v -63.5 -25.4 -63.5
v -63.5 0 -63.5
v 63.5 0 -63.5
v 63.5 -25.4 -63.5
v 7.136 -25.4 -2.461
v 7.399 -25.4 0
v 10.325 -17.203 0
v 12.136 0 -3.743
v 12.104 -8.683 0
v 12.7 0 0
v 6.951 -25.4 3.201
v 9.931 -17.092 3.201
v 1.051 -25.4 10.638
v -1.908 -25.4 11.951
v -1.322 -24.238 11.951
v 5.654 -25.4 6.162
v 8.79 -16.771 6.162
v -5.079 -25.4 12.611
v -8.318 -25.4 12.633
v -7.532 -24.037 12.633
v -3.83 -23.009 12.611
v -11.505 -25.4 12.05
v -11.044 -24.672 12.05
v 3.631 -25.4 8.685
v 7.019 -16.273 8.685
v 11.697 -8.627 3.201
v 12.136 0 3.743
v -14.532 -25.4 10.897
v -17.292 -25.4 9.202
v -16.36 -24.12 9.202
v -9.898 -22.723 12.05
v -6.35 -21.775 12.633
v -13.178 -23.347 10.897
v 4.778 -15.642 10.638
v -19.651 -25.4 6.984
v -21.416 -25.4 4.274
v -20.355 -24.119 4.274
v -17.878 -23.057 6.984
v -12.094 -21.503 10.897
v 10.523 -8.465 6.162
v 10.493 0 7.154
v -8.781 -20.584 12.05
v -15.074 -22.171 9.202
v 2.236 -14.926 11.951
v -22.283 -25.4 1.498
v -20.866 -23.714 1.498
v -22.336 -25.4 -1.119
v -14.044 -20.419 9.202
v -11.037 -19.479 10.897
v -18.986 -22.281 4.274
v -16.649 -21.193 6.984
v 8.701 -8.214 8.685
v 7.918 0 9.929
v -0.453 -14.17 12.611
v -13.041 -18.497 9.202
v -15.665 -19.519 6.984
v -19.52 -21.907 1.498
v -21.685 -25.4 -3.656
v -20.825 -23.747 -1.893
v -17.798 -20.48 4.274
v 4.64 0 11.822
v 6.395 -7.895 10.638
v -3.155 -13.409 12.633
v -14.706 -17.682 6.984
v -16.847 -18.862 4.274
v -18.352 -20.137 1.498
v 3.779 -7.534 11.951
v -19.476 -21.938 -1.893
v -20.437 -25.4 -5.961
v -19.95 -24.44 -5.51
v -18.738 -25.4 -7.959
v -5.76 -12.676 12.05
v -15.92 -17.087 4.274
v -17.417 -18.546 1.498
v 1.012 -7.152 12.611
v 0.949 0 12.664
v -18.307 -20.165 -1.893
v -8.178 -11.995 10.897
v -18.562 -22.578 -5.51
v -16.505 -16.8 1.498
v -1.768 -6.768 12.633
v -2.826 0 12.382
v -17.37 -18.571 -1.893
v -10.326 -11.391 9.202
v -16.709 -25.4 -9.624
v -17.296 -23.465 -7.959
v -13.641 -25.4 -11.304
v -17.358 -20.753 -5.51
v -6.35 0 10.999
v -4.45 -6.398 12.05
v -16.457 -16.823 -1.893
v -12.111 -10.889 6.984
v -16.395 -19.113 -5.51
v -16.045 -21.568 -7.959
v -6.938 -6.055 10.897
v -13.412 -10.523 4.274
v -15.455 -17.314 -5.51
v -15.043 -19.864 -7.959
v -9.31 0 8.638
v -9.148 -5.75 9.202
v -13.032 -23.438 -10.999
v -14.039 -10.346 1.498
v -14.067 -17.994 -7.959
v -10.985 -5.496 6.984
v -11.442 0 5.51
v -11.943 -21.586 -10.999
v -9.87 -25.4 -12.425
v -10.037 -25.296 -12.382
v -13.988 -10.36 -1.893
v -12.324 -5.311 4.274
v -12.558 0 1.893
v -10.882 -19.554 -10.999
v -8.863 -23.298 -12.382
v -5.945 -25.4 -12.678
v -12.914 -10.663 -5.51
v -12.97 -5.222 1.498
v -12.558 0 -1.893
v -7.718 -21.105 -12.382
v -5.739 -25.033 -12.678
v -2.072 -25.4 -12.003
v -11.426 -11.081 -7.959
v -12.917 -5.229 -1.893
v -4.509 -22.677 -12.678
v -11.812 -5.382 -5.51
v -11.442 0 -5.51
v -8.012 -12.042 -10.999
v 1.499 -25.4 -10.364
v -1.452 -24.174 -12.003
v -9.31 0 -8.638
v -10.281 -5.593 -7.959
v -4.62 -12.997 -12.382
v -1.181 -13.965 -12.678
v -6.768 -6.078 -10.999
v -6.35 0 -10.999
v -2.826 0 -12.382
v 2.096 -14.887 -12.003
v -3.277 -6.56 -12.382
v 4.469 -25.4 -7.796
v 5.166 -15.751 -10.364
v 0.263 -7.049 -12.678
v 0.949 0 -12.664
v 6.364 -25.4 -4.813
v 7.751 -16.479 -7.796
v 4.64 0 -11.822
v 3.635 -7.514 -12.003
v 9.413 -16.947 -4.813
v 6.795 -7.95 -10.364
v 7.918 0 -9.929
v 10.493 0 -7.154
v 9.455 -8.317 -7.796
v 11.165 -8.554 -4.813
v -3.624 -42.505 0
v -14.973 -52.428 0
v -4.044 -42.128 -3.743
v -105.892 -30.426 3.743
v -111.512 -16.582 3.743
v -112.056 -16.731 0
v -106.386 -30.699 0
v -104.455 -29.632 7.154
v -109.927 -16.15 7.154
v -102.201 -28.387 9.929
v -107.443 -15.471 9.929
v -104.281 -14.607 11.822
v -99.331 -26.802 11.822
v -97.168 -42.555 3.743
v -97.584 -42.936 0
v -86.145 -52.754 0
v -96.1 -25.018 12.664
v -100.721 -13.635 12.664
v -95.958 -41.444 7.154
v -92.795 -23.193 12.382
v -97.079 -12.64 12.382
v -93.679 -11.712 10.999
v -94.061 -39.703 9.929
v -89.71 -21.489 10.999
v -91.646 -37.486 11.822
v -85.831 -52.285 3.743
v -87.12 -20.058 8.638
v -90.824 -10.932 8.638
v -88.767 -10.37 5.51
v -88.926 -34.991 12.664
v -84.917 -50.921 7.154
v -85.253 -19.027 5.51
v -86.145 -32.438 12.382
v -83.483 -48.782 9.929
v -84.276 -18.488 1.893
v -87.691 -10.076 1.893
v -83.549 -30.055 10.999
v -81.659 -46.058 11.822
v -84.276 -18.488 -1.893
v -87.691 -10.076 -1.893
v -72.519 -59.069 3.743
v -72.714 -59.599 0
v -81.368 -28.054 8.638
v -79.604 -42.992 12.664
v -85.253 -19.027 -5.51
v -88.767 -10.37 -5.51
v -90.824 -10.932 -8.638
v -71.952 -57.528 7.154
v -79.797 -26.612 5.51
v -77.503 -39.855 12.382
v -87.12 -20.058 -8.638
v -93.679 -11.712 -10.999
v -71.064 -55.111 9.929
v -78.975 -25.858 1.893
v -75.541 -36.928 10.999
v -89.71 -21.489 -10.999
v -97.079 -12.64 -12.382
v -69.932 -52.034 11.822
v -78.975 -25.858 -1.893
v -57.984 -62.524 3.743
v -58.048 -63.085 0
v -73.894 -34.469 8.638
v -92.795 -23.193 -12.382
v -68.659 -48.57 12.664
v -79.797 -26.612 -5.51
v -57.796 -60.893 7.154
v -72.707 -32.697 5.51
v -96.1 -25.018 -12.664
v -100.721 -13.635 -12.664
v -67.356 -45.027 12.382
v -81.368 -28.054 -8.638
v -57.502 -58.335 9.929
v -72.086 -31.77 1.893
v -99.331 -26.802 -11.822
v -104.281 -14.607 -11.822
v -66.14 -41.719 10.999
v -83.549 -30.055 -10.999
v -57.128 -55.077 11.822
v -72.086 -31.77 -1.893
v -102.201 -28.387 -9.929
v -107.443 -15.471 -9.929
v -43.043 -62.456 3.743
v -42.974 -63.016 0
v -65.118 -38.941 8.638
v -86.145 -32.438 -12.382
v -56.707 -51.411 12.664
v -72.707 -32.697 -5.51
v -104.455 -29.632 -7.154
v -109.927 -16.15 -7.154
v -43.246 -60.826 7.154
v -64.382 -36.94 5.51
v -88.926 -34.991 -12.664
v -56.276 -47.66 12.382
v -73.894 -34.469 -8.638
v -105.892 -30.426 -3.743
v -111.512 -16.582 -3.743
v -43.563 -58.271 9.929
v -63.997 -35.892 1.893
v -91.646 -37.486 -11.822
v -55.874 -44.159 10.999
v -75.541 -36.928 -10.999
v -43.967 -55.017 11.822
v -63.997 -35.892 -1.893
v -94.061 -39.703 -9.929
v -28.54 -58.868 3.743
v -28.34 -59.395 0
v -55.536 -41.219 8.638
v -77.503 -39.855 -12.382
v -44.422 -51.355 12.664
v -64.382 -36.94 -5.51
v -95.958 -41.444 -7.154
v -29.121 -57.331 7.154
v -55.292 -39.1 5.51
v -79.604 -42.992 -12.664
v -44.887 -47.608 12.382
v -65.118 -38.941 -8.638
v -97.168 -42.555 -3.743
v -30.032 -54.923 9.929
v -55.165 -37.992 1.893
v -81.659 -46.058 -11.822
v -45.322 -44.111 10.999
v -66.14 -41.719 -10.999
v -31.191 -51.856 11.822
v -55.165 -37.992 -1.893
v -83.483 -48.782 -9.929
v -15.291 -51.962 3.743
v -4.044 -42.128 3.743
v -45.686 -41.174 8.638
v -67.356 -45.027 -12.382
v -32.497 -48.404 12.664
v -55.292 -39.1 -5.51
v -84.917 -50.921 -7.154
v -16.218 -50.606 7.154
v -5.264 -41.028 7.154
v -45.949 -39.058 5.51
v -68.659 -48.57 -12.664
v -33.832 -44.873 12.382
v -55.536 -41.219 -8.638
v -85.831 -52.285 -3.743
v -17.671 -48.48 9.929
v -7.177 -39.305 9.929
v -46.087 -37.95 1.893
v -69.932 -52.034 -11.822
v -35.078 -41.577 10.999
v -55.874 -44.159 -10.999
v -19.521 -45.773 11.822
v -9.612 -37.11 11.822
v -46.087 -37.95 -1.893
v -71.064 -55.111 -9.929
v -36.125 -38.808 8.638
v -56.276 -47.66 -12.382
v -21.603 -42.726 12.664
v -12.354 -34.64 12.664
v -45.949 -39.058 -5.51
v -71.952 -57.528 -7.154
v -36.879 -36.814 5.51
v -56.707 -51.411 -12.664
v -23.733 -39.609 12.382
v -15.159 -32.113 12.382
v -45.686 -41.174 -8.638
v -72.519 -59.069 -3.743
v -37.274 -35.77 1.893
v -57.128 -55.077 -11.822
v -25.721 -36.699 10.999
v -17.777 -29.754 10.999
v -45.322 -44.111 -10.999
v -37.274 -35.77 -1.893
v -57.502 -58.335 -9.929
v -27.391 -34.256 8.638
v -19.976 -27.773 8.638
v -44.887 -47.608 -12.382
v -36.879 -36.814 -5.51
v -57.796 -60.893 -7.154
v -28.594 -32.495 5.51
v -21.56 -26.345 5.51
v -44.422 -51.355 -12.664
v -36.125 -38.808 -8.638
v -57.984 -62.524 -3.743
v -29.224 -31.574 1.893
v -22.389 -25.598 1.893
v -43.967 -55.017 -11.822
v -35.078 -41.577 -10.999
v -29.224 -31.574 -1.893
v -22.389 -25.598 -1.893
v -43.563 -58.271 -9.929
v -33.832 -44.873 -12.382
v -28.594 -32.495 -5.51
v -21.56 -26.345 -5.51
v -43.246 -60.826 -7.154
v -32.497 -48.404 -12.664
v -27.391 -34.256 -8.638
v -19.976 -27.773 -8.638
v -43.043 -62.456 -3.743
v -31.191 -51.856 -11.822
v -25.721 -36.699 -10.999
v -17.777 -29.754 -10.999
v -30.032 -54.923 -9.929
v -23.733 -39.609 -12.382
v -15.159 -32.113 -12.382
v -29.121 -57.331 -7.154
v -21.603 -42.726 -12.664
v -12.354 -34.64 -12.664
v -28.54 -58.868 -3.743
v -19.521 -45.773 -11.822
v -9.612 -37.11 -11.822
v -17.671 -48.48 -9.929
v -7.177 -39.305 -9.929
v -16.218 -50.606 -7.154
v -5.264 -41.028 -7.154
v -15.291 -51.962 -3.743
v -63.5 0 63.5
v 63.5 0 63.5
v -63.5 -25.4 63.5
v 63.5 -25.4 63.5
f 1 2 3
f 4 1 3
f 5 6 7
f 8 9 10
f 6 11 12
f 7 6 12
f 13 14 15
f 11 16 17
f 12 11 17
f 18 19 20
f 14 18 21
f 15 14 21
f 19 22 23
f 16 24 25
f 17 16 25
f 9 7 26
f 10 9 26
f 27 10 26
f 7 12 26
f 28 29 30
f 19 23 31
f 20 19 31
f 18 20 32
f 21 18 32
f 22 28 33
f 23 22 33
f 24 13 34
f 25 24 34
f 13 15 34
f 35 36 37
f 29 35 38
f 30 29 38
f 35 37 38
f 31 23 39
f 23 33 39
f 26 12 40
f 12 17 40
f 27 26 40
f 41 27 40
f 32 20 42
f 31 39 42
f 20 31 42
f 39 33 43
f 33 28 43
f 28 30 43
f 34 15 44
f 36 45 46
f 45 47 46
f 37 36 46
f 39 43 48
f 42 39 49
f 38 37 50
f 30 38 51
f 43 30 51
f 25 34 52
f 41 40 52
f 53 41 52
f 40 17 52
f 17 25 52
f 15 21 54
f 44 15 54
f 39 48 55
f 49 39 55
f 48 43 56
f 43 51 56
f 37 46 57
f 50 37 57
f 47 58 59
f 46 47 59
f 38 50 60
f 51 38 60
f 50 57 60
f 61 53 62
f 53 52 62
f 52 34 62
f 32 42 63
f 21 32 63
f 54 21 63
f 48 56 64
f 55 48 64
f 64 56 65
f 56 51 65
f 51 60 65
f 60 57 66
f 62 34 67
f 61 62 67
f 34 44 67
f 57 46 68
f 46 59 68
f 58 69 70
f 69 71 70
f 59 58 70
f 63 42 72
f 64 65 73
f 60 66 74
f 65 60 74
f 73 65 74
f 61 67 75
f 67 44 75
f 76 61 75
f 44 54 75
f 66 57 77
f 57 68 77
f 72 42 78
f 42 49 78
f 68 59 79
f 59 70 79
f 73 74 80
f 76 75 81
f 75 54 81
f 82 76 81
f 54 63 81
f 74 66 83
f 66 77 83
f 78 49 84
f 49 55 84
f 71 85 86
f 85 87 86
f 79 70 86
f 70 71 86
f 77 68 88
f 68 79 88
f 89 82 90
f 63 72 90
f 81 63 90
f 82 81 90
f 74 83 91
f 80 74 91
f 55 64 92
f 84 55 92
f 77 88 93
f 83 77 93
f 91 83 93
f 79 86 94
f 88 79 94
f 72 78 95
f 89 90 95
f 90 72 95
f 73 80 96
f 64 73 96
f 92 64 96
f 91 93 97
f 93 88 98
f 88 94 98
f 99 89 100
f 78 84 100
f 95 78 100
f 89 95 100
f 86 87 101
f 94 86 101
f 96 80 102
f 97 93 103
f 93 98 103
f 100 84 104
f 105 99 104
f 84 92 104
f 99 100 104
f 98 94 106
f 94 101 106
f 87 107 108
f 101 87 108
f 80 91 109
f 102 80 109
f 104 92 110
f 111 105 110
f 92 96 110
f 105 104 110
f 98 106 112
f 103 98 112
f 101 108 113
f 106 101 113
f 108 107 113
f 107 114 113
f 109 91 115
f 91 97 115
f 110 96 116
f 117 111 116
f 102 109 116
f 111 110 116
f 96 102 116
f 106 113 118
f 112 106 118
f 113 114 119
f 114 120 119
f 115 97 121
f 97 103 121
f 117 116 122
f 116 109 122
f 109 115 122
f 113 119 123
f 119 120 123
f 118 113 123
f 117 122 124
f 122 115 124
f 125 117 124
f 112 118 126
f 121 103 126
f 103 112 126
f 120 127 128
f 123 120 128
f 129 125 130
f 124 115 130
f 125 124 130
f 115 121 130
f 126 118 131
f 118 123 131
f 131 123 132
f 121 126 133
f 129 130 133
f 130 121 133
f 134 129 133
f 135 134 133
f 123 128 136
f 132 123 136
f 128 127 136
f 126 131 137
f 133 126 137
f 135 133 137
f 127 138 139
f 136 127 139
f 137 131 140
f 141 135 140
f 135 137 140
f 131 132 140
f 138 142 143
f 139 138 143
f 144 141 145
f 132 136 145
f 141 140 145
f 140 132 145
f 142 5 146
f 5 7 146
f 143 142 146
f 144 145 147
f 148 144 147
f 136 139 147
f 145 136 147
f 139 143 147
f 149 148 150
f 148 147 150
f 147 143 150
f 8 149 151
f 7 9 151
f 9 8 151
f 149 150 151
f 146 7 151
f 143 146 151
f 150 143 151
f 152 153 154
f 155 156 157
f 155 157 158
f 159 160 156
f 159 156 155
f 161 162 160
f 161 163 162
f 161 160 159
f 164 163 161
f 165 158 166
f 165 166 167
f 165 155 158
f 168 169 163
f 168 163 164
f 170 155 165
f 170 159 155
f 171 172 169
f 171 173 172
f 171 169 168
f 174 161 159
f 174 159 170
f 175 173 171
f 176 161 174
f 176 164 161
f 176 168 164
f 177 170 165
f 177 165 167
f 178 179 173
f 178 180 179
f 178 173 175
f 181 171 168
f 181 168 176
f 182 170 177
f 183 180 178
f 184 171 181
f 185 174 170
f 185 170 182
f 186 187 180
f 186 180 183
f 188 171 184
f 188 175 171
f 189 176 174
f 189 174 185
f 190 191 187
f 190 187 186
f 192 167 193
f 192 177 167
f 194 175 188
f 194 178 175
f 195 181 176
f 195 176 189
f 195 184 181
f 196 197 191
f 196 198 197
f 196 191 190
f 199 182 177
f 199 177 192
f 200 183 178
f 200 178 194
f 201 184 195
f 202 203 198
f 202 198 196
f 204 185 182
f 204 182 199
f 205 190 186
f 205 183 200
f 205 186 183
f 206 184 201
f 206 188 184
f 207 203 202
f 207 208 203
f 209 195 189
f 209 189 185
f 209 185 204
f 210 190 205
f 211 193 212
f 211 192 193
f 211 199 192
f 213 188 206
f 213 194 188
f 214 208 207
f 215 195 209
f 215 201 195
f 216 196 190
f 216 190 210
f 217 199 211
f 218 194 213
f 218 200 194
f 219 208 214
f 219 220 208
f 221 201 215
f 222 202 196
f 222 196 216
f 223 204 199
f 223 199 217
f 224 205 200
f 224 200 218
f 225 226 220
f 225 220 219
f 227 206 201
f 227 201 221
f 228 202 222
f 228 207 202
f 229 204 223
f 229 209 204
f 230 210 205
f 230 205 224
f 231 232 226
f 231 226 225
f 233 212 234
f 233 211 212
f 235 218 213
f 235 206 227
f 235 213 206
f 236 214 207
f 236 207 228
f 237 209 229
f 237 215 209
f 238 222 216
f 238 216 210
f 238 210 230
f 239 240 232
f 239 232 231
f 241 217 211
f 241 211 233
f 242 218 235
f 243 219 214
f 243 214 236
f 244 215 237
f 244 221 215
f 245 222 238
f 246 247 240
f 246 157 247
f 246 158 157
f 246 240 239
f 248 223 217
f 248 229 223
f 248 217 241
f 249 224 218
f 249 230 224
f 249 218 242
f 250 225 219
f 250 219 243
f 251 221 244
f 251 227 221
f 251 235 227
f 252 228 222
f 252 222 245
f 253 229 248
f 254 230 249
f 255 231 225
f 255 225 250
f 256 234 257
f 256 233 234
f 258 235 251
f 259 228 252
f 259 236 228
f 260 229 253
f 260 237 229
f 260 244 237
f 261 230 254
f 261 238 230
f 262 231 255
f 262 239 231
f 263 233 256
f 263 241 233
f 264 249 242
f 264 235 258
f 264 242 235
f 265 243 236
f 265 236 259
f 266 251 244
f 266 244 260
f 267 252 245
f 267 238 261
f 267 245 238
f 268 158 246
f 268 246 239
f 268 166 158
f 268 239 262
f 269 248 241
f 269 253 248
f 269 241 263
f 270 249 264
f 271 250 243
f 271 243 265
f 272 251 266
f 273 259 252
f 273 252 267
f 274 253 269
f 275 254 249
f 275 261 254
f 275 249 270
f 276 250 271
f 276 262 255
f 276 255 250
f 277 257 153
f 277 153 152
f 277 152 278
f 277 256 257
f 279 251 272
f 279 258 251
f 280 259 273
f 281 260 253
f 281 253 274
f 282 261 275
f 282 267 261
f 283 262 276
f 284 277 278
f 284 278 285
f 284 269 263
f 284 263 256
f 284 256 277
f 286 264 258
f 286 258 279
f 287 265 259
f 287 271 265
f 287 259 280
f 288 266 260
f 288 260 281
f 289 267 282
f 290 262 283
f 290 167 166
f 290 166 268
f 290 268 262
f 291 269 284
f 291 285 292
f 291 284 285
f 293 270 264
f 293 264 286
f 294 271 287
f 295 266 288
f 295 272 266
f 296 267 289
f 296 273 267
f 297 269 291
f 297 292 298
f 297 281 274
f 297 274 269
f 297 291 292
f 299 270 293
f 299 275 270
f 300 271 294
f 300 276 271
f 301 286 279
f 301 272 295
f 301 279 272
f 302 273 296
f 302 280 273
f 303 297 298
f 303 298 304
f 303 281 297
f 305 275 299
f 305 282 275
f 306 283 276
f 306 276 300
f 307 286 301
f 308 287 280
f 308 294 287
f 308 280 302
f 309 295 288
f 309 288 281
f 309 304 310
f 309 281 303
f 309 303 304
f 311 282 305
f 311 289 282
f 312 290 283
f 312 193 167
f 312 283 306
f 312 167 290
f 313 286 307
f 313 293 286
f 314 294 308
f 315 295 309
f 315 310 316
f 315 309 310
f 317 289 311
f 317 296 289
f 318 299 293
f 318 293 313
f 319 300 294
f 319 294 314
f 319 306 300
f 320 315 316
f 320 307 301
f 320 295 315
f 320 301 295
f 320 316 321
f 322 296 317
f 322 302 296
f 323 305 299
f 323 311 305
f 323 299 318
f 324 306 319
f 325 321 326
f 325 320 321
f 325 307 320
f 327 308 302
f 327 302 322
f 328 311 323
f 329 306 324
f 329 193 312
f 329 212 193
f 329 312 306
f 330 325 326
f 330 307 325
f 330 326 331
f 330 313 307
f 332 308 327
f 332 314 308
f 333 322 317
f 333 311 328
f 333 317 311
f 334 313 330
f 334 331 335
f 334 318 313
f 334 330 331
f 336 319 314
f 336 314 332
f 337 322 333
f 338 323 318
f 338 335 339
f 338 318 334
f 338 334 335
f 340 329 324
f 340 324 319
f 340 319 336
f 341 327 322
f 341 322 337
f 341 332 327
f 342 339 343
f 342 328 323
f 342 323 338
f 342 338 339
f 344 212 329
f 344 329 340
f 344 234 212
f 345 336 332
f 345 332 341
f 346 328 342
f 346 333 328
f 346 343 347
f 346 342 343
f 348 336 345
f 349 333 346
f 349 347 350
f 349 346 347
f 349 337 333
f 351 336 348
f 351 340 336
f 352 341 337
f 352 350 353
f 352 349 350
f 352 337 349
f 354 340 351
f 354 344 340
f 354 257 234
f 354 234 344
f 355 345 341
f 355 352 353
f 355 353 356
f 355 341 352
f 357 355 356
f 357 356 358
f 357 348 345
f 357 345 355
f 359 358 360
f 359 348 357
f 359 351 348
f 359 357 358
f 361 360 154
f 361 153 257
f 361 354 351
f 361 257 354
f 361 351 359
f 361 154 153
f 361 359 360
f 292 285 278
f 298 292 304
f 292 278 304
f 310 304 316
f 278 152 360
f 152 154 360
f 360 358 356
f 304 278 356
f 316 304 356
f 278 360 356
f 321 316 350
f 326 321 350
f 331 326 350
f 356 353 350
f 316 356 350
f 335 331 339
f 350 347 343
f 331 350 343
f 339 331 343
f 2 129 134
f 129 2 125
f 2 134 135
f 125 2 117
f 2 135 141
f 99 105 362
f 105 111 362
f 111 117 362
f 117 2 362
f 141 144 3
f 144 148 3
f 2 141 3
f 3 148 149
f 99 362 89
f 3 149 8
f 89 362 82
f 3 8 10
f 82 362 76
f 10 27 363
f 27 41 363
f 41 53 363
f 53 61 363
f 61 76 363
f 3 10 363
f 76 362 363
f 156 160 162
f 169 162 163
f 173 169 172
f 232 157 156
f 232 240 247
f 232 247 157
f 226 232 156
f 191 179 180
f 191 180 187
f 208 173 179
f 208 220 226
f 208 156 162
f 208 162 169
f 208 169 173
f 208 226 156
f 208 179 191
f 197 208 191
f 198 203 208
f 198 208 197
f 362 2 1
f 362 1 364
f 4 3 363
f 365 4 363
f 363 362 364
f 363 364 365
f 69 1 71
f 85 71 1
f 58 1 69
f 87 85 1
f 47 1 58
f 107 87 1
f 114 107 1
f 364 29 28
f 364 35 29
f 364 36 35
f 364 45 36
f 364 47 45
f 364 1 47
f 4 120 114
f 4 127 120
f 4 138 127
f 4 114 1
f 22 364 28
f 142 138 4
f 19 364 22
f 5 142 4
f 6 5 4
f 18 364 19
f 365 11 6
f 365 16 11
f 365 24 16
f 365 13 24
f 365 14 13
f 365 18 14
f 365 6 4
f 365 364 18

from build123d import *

# Parameters (mm, degrees)
F1_W     = 127
F1_H     = 127
F2_DEPTH = 25.4
F0_R     = 12.7


with BuildPart() as f2:
    # F1 (on Front) → F2 (new body)
    with BuildSketch(Plane.XZ):
        Rectangle(F1_W, F1_H)
    extrude(amount=F2_DEPTH)


with BuildPart() as f4:
    # F4: sweep along a path in F3
    with BuildLine(Plane.XY) as f4_path:
        ThreePointArc((-99.8049734555, -13.3847890021), (-44.0476911925, -50.3492435471), (0, 0))
    # F0 (on Front) → F4 (sweep)
    with BuildSketch(Plane.XZ):
        Circle(F0_R)
    sweep(path=f4_path.line)


with BuildPart() as f6_tool:
    # F6: sweep along a path in F5
    with BuildLine(Plane.XY) as f6_path:
        ThreePointArc((-13.059517534, -34.004352416), (-3.3771336312, -18.2129554264), (0, 0))
    # F0 (on Front) → F6 (sweep)
    with BuildSketch(Plane.XZ):
        Circle(F0_R)
    sweep(path=f6_path.line)


with BuildPart() as f2_1:
    add(f2.part)

    # F6: cut by f6_tool
    add(f6_tool.part, mode=Mode.SUBTRACT)


with BuildPart() as f4_1:
    add(f4.part)

    # F6: cut by f6_tool
    add(f6_tool.part, mode=Mode.SUBTRACT)


solid = Compound([f2_1.part, f4_1.part])
